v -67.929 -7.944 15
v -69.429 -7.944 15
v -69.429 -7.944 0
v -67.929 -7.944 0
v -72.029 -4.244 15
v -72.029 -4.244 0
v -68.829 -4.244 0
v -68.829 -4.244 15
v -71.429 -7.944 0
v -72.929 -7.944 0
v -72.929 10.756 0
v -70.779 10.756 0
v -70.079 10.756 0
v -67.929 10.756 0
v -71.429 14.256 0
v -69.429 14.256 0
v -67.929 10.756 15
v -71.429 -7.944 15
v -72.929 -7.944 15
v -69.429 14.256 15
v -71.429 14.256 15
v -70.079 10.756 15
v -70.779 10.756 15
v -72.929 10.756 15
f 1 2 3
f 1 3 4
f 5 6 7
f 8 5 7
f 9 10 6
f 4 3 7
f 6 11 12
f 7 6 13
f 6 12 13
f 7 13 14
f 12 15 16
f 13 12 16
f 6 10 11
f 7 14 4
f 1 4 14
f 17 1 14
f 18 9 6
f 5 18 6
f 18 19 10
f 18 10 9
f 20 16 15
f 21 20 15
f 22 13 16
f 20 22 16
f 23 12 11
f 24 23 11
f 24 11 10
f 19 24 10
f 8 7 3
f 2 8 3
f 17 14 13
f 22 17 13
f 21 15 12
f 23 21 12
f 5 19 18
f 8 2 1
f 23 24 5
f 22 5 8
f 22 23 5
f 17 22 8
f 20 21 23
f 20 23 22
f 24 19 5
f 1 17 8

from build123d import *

# Parameters (mm, degrees)
F1_DEPTH = 15


with BuildPart() as f1:
    # F0 (on Top) → F1 (new body)
    with BuildSketch(Plane.XY):
        Polygon((-70.779354, 10.755781), (-72.929354, 10.755781), (-72.929354, -4.244219), (-72.029354, -4.244219), (-68.829354, -4.244219), (-67.929354, -4.244219), (-67.929354, 10.755781), (-70.079354, 10.755781), align=None)
        Polygon((-71.429354, 14.255781), (-70.779354, 10.755781), (-70.079354, 10.755781), (-69.429354, 14.255781), align=None)
        Polygon((-72.029354, -4.244219), (-72.929354, -4.244219), (-72.929354, -7.944219), (-71.429354, -7.944219), align=None)
        Polygon((-67.929354, -4.244219), (-68.829354, -4.244219), (-69.429354, -7.944219), (-67.929354, -7.944219), align=None)
    extrude(amount=F1_DEPTH)


solid = f1.part
